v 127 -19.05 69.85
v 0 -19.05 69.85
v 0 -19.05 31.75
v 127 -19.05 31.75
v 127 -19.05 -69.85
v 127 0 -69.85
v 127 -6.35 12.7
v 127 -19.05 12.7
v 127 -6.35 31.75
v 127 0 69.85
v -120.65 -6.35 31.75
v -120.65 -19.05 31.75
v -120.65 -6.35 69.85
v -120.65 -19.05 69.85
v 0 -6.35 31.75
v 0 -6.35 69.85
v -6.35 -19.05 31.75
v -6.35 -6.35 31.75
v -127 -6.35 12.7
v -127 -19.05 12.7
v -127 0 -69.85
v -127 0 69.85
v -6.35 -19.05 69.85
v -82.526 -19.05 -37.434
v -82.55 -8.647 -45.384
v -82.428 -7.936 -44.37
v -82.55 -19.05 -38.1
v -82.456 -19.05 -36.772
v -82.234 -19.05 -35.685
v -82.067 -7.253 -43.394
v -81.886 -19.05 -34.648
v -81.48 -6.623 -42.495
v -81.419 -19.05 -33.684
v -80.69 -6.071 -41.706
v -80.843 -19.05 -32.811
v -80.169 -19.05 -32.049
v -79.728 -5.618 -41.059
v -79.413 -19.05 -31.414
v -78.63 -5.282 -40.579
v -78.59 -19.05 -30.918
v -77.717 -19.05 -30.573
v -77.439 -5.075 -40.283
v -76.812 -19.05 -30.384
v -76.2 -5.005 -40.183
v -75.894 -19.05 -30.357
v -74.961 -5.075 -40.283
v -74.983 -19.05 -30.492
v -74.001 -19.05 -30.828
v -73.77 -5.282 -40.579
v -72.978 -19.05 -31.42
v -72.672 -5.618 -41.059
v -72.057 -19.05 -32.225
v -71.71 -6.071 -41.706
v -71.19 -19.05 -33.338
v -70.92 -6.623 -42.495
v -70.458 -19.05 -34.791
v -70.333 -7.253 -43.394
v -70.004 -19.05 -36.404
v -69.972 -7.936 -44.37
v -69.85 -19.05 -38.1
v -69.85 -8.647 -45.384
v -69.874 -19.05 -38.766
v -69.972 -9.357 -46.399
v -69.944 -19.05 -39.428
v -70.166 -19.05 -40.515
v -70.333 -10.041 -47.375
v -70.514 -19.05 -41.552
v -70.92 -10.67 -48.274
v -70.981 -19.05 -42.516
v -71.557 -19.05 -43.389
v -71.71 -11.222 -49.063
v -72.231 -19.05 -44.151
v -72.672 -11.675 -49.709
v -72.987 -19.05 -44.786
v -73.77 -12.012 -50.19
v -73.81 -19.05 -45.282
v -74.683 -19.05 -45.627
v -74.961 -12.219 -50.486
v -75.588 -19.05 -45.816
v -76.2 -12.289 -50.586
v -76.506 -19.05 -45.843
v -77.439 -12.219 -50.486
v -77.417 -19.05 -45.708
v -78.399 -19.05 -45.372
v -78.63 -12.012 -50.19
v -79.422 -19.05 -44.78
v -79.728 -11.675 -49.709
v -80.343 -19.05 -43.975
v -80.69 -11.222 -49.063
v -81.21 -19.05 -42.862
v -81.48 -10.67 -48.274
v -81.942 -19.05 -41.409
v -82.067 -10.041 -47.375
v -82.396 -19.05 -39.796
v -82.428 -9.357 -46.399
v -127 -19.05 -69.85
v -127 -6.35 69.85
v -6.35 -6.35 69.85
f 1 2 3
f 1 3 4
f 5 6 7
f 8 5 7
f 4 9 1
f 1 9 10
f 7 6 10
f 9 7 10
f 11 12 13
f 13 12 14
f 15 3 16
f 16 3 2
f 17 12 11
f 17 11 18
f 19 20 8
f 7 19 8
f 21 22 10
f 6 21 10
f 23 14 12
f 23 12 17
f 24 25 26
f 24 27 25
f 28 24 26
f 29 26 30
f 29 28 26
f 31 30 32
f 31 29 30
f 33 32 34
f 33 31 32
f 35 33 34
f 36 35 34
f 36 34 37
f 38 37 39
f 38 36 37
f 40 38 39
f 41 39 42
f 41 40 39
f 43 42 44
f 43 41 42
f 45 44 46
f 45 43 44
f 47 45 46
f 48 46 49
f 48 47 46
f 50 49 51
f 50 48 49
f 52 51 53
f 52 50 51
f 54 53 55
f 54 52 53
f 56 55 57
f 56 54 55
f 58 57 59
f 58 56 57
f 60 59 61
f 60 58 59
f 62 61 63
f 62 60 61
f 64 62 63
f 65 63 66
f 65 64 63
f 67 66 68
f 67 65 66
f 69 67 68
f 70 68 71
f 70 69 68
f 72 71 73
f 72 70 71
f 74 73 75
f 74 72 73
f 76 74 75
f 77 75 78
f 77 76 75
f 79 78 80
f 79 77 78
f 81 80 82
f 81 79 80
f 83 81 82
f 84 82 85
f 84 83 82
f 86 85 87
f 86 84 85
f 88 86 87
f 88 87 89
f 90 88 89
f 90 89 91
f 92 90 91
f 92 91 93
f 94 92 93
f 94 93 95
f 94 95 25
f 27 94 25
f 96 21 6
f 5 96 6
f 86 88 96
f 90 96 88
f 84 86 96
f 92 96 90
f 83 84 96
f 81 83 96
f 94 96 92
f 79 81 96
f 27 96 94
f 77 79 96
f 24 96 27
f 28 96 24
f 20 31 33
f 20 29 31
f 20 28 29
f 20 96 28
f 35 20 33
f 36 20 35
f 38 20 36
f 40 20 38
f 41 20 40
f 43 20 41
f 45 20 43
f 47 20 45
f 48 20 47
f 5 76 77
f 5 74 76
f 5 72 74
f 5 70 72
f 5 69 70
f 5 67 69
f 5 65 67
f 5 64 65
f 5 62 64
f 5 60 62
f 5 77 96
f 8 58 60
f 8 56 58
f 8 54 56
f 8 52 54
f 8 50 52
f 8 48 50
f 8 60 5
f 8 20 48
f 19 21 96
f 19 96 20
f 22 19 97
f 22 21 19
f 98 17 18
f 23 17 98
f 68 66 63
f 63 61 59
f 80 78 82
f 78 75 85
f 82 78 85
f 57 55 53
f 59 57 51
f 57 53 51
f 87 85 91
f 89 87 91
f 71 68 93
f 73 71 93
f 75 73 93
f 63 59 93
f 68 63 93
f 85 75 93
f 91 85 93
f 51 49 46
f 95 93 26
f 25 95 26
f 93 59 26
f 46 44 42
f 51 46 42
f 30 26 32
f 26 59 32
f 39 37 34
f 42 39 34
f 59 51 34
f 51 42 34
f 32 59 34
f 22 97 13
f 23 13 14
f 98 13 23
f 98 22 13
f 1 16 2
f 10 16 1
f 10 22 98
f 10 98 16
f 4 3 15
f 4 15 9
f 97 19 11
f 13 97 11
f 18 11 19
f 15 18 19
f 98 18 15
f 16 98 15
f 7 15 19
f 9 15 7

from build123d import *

# Parameters (mm, degrees)
F0_W          = 254
F0_H          = 139.7
F1_DEPTH      = 19.05
F2_W          = 254
F2_H          = 19.05
F3_DEPTH      = 12.7
F4_W          = 6.35
F4_H          = 38.1
F5_DEPTH      = 12.7
F8_R          = 6.35
F9_DEPTH      = 12.7
F9_DEPTH_BACK = 12.7


with BuildPart() as f1:
    # F0 (on Front) → F1 (new body)
    with BuildSketch(Plane.XZ):
        Rectangle(F0_W, F0_H)
    extrude(amount=F1_DEPTH)

    # F2 (on face) → F3 (cut)
    with BuildSketch(Plane.XZ.offset(19.05)):
        with Locations((0, 22.225)):
            Rectangle(F2_W, F2_H)
    extrude(amount=-F3_DEPTH, mode=Mode.SUBTRACT)

    # F4 (on face) → F5 (cut)
    with BuildSketch(Plane.XZ.offset(19.05)):
        with Locations((-3.175, 50.8)):
            Rectangle(F4_W, F4_H)
        with Locations((-123.825, 50.8)):
            Rectangle(F4_W, F4_H)
    extrude(amount=-F5_DEPTH, mode=Mode.SUBTRACT)

    # F8 (on face) → F9 (cut, two sides)
    with BuildSketch(Plane(origin=(0, 5.1184025608, -3.5839440567), x_dir=(-1, 0, 0), z_dir=(0, 0.8191520443, -0.5735764364))) as f9_sk:
        with Locations((76.2, -42.1363239999)):
            Circle(F8_R)
    extrude(amount=F9_DEPTH, mode=Mode.SUBTRACT)
    extrude(f9_sk.sketch, amount=-F9_DEPTH_BACK, mode=Mode.SUBTRACT)


solid = f1.part
